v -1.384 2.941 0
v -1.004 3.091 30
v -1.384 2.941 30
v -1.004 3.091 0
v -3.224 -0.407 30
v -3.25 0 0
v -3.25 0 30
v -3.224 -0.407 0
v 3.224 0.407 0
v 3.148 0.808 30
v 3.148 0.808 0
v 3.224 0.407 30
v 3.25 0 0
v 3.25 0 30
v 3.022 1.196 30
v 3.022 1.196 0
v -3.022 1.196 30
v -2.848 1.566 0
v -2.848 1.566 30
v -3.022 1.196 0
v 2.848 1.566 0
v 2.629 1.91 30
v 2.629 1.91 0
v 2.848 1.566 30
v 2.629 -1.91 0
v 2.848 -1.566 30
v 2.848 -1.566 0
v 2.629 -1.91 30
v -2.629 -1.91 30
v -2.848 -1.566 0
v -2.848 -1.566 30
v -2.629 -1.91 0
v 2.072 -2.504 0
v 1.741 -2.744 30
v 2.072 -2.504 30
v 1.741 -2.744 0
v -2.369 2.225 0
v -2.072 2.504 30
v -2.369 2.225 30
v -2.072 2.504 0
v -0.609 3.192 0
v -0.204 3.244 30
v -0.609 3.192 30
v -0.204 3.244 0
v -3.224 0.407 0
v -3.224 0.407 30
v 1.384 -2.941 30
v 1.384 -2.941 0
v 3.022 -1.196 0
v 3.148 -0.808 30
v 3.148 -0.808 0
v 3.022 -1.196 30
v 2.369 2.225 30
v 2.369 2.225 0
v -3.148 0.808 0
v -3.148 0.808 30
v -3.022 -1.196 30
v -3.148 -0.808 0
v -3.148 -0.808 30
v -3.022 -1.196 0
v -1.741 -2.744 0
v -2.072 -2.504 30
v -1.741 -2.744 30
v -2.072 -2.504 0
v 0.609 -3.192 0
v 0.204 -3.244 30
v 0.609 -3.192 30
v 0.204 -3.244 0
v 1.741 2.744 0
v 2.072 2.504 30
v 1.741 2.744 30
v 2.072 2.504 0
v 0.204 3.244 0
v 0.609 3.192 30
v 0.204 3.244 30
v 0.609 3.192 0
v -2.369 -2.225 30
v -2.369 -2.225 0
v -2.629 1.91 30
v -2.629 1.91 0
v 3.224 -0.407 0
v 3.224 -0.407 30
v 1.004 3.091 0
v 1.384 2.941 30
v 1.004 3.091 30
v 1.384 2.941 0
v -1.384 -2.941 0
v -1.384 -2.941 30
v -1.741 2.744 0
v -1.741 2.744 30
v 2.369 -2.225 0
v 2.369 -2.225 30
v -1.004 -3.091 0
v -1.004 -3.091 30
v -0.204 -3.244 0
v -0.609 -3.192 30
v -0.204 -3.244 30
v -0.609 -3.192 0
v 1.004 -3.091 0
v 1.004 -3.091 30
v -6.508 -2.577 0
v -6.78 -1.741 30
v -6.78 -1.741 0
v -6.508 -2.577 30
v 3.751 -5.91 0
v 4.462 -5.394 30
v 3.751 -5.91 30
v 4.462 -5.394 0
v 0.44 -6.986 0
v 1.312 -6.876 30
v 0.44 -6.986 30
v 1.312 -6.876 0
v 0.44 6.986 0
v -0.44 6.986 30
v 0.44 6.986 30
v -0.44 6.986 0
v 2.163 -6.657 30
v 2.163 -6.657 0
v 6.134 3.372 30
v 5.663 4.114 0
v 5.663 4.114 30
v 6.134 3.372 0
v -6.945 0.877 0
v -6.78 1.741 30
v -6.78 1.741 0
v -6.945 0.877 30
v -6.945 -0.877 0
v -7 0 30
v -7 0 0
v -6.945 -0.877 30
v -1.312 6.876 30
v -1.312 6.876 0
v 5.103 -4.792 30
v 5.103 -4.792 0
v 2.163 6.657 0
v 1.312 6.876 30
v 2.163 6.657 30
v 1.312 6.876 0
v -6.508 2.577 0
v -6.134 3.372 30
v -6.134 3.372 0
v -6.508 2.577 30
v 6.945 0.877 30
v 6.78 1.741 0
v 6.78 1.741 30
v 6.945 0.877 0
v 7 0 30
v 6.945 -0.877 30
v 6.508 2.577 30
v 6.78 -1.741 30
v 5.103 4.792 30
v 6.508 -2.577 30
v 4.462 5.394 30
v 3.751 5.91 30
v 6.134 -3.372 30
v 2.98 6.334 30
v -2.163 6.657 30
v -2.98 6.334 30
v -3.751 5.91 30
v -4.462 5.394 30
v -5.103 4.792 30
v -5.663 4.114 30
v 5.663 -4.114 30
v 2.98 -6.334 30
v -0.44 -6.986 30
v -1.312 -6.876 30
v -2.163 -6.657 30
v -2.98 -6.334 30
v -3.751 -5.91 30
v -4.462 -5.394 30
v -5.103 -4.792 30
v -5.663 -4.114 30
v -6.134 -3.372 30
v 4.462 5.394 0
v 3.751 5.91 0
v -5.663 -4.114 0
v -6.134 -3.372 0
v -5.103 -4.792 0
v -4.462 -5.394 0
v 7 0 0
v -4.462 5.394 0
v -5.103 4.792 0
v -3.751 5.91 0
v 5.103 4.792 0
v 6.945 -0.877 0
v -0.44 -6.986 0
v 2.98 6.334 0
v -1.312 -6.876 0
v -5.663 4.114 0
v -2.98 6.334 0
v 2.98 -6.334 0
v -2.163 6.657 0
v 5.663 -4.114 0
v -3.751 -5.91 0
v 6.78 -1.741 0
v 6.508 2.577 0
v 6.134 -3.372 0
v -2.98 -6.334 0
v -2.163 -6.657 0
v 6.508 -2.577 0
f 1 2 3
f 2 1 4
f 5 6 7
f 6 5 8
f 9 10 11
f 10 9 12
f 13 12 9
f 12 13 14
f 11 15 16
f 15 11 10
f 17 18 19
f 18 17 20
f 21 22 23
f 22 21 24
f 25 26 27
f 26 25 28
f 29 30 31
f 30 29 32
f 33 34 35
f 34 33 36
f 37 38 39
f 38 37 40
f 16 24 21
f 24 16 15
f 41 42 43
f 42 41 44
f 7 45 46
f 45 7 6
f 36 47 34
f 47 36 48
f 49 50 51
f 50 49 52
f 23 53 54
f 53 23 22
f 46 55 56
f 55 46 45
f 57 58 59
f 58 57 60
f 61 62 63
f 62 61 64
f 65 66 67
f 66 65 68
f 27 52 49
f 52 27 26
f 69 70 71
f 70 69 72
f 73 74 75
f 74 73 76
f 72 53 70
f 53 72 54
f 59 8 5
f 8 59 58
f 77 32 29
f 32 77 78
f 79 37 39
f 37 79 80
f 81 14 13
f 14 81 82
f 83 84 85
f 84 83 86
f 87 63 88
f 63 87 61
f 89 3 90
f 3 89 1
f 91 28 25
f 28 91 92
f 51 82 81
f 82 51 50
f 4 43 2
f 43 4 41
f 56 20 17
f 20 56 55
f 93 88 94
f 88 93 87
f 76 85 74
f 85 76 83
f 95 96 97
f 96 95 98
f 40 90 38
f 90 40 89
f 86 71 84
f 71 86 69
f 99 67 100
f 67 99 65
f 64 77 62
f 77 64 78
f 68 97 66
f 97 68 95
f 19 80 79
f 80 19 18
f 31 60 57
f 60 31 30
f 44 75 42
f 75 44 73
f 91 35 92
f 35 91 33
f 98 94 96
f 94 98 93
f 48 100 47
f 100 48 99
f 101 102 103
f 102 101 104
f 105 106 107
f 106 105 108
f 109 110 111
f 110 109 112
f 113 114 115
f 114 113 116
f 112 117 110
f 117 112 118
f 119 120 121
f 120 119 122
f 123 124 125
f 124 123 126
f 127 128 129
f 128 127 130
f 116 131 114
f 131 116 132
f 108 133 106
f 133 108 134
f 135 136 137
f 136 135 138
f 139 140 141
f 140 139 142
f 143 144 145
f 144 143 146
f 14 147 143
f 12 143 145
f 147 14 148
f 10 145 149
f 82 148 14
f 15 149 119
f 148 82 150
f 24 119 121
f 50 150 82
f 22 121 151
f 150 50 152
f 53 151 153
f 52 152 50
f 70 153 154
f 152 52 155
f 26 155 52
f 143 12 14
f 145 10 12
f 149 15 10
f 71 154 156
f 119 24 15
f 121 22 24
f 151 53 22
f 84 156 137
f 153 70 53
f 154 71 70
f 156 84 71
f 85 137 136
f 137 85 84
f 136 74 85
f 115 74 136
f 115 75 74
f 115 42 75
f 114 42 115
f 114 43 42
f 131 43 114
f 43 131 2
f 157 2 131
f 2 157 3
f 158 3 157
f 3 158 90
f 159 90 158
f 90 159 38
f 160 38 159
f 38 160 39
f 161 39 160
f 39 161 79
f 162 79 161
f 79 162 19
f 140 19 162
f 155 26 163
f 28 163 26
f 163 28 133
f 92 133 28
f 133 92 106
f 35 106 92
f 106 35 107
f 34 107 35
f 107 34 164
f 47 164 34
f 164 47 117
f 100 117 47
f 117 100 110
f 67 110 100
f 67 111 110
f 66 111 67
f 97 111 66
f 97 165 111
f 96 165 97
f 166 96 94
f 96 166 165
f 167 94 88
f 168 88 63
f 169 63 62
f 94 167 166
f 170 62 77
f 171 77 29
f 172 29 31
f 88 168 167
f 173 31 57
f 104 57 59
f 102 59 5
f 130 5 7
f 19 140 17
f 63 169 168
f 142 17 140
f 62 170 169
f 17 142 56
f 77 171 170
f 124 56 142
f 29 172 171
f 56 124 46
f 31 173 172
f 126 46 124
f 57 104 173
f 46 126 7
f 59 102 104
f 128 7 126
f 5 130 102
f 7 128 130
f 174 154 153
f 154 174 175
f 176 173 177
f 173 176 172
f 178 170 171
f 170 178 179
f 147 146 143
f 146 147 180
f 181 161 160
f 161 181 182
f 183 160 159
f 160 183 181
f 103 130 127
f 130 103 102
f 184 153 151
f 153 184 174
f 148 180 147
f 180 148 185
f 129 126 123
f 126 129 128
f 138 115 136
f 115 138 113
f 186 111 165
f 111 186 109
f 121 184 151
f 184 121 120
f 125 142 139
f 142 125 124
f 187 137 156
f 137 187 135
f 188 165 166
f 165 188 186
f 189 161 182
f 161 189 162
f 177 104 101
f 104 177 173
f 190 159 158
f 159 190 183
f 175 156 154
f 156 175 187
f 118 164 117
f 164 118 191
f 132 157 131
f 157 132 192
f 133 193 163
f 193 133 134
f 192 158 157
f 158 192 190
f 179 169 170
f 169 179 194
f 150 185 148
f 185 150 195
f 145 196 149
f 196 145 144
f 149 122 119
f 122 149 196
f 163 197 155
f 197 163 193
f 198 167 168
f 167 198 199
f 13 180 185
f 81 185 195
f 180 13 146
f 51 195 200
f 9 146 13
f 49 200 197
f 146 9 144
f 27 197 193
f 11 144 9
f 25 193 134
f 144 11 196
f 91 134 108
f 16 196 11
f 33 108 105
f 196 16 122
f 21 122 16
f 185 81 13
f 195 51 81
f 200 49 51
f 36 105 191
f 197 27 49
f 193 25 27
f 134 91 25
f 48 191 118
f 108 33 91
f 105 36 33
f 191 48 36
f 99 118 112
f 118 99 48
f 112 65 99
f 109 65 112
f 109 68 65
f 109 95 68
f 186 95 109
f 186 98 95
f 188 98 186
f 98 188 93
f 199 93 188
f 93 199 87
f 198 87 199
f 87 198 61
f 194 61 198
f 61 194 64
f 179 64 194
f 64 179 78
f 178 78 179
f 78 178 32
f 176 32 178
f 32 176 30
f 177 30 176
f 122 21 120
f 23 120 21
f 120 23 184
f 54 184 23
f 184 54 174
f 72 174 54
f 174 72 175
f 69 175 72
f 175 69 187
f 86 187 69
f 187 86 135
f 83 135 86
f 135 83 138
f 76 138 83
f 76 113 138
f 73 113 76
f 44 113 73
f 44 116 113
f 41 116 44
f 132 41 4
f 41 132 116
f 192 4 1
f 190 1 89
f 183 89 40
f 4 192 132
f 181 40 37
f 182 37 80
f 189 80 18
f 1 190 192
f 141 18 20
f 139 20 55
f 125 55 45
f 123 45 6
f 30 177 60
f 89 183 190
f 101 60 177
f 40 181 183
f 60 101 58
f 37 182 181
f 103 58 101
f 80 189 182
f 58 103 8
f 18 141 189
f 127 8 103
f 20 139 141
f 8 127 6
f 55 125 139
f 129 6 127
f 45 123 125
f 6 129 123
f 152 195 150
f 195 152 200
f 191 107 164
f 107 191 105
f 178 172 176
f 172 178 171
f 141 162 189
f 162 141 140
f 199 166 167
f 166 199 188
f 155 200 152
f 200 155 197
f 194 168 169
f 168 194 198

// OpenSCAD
$fn = 50;


difference() {
	union() {
		*color(alpha = 1.0000000000, c = "gray") {
			translate(v = [0, 7, 0]) {
				linear_extrude(height = 1) {
					text(font = "Arial:style=Bold", halign = "center", size = 4.5000000000, text = "COMMENT plate main", valign = "center");
				}
			}
		}
		*color(alpha = 1.0000000000, c = "gray") {
			translate(v = [0, 14, 0]) {
				linear_extrude(height = 1) {
					text(font = "Arial:style=Bold", halign = "center", size = 4.5000000000, text = "COMMENT description oobb_plate_shape_p_type_30_depth_1_width_1_height_30_thickness_true_both_holes", valign = "center");
				}
			}
		}
		cylinder(h = 30, r = 7.0000000000);
	}
	union() {
		*color(alpha = 1.0000000000, c = "gray") {
			translate(v = [0, 7, 0]) {
				linear_extrude(height = 1) {
					text(font = "Arial:style=Bold", halign = "center", size = 4.5000000000, text = "COMMENT holes main", valign = "center");
				}
			}
		}
		*color(alpha = 1.0000000000, c = "gray") {
			translate(v = [0, 14, 0]) {
				linear_extrude(height = 1) {
					text(font = "Arial:style=Bold", halign = "center", size = 4.5000000000, text = "COMMENT description oobb_holes_shape_n_type_1_width_1_height_30_thickness_true_both_holes", valign = "center");
				}
			}
		}
		translate(v = [0, 0, -50]) {
			cylinder(h = 100, r = 3.2500000000);
		}
		translate(v = [0, 0, -50]) {
			cylinder(h = 100, r = 1.8000000000);
		}
	}
}
